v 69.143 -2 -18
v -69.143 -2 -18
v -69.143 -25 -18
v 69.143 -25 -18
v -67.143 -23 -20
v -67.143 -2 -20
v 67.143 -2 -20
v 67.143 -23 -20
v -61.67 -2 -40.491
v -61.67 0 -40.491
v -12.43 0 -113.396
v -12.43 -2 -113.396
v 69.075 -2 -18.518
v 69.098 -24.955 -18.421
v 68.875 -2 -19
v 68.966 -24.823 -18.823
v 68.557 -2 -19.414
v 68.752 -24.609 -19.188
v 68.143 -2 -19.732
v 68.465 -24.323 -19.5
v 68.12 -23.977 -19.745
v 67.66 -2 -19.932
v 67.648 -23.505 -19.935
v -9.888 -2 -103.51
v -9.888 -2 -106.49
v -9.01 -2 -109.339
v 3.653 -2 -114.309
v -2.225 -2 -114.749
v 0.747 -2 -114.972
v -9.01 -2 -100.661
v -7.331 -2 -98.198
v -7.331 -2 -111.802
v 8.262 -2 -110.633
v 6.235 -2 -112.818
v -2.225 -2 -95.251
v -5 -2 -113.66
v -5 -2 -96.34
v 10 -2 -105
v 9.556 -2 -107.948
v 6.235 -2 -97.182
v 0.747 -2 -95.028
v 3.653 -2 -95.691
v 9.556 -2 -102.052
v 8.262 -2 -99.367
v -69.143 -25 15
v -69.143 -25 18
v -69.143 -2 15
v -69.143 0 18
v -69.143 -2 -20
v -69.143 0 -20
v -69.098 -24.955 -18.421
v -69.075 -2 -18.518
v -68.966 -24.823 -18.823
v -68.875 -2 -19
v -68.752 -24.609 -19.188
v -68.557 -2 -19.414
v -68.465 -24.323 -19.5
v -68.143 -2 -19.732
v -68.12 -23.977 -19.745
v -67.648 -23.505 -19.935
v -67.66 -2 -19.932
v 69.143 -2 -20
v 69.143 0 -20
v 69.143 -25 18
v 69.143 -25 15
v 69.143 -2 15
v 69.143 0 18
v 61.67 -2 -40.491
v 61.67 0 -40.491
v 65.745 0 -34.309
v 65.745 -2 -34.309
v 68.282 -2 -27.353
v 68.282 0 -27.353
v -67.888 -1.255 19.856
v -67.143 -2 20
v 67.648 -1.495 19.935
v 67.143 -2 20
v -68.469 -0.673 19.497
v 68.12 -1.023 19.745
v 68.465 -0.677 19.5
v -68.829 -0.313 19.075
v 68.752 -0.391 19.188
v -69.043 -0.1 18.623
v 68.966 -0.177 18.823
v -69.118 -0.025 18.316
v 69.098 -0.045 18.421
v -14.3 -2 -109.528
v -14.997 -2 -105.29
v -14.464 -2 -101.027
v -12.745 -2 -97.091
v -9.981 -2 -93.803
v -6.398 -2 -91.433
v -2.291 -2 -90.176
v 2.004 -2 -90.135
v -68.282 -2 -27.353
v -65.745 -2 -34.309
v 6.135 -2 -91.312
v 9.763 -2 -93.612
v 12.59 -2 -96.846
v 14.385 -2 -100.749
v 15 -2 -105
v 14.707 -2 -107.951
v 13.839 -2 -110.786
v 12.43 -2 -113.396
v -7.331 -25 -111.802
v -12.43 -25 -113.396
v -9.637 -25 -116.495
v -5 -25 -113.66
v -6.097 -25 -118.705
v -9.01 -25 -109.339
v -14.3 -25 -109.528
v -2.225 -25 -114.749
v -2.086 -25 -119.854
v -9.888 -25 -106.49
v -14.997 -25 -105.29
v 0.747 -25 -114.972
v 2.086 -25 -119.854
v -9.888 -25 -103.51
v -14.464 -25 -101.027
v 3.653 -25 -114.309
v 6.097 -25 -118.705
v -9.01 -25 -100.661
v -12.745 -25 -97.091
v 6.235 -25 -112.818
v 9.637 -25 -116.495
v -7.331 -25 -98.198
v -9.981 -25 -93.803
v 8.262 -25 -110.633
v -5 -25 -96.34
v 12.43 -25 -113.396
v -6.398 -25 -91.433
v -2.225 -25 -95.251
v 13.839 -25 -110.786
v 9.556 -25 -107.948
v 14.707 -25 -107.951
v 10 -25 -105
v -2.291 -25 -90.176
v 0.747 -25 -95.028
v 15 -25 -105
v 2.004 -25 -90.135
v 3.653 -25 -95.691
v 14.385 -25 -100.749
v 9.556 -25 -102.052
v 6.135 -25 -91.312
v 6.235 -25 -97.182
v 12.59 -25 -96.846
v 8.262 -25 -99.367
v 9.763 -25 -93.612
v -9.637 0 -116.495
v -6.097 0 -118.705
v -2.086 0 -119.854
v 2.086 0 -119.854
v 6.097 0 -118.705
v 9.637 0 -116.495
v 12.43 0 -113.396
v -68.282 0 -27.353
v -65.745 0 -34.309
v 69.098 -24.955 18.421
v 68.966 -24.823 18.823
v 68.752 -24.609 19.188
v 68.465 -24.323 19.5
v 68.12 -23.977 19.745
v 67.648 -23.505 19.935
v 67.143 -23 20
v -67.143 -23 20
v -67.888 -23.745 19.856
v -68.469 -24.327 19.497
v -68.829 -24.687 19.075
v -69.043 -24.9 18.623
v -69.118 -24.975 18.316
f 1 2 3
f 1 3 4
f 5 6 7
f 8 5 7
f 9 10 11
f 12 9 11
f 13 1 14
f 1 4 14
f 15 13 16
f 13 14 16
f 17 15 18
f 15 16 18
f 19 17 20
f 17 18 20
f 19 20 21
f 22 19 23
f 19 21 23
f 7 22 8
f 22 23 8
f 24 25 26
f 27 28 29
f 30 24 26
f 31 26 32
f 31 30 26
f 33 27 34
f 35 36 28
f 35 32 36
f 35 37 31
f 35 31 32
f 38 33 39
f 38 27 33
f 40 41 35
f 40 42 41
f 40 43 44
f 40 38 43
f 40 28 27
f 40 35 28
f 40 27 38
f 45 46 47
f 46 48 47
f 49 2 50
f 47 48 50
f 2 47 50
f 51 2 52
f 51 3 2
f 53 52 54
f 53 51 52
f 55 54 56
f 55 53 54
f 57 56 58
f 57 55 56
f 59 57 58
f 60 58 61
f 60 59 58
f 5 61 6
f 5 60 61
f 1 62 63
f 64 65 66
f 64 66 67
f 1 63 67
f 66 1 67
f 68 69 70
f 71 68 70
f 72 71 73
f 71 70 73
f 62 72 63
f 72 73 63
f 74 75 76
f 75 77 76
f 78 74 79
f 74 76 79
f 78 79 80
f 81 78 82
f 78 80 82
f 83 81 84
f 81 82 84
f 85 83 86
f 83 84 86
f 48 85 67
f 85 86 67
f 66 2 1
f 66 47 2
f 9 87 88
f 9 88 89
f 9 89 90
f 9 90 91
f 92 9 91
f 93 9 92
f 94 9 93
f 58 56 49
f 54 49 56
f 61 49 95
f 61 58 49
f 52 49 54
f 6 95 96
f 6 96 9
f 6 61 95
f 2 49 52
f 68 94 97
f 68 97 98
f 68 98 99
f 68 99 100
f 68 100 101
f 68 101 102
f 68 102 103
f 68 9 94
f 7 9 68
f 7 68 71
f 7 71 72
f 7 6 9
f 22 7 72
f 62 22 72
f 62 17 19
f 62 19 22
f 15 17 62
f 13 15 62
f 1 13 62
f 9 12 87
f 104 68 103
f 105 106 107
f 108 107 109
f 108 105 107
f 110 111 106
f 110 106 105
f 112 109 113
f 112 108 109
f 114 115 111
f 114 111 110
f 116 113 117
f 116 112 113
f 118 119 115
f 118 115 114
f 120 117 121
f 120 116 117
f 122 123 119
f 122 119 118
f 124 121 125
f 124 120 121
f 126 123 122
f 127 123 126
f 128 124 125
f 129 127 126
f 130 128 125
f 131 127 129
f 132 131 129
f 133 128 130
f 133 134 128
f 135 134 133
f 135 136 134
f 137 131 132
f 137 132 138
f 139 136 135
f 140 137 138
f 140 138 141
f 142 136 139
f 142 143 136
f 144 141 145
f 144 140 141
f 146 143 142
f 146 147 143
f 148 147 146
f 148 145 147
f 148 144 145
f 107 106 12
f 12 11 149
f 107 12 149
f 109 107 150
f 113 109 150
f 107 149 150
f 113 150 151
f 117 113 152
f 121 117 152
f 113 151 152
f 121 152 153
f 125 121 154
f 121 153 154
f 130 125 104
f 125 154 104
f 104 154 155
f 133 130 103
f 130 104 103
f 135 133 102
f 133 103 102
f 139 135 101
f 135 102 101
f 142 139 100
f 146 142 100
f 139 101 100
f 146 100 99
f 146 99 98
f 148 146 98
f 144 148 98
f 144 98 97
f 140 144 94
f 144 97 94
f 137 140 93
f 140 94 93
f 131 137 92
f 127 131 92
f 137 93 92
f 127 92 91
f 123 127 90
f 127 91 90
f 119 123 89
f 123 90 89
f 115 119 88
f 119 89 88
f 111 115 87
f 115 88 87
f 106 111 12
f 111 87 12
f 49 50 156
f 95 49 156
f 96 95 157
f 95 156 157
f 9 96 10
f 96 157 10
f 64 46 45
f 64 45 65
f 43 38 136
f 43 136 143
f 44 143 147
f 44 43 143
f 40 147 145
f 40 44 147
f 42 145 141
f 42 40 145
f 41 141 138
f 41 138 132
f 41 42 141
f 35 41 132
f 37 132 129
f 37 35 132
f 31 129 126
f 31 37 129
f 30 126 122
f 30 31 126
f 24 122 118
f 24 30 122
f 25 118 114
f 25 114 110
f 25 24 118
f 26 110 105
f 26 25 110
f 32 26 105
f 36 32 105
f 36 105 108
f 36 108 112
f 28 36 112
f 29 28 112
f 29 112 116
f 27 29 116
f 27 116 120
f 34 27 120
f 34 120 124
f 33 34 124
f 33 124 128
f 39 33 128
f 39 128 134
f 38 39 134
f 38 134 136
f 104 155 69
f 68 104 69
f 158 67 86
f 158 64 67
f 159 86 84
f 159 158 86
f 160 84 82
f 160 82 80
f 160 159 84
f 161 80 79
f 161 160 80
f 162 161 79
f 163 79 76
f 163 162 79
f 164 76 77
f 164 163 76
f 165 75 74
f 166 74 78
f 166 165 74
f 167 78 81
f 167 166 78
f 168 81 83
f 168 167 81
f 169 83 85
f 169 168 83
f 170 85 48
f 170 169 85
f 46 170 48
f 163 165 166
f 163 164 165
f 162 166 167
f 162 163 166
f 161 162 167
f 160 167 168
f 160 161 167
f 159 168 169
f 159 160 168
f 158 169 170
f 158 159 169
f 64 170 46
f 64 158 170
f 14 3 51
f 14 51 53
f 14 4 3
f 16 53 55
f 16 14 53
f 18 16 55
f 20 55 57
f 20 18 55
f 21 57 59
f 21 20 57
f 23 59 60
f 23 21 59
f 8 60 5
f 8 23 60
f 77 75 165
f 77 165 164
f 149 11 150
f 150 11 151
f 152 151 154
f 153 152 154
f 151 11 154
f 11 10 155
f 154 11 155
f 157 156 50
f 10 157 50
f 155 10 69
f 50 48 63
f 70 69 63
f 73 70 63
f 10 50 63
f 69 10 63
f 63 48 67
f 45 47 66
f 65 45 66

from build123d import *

# Parameters (mm, degrees)
F0_W     = 138.2855419193
F0_H     = 33
F0_R     = 10
F0_H_2   = 5
F0_H_3   = 2
F1_DEPTH = 2
F2_DEPTH = 25
F3_R     = 1.99999


# Not quite as in the source:
# - a fillet or chamfer is up to 0.001 mm smaller than in the source, because OpenCascade refuses the exact size


with BuildPart() as f1:
    # F0 (on Front) → F1 (new body)
    with BuildSketch(Plane.XZ):
        with BuildLine():
            ThreePointArc((61.670333147, -40.4906272888), (67.2163679442, -30.9053098713), (69.1427709597, -20))
            Line((69.1427709597, -20), (-69.1427709597, -20))
            ThreePointArc((-69.1427709597, -20), (-67.2163679442, -30.9053098713), (-61.670333147, -40.4906272888))
            Line((-61.670333147, -40.4906272888), (-12.4304277098, -113.3955027814))
            ThreePointArc((-12.4304277098, -113.3955027814), (-4.3899649403, -90.6567713599), (15, -105))
            ThreePointArc((15, -105), (14.3432286401, -109.3899649403), (12.4304277098, -113.3955027814))
            Line((12.4304277098, -113.3955027814), (61.670333147, -40.4906272888))
        make_face()
        with Locations((0, -1.5)):
            Rectangle(F0_W, F0_H)
        with BuildLine():
            ThreePointArc((-12.4304277098, -113.3955027814), (0, -120), (12.4304277098, -113.3955027814))
            ThreePointArc((12.4304277098, -113.3955027814), (14.3432286401, -109.3899649403), (15, -105))
            ThreePointArc((15, -105), (-4.3899649403, -90.6567713599), (-12.4304277098, -113.3955027814))
        make_face()
        with Locations((0, -105)):
            Circle(F0_R, mode=Mode.SUBTRACT)
        with Locations((0, 17.5)):
            Rectangle(F0_W, F0_H_2)
        with Locations((0, -105)):
            Circle(F0_R)
        with Locations((0, -19)):
            Rectangle(F0_W, F0_H_3)
    extrude(amount=F1_DEPTH)

    # F0 (on Front) → F2 (join)
    with BuildSketch(Plane.XZ):
        with Locations((0, 17.5)):
            Rectangle(F0_W, F0_H_2)
        with Locations((0, -19)):
            Rectangle(F0_W, F0_H_3)
        with BuildLine():
            ThreePointArc((-12.4304277098, -113.3955027814), (0, -120), (12.4304277098, -113.3955027814))
            ThreePointArc((12.4304277098, -113.3955027814), (14.3432286401, -109.3899649403), (15, -105))
            ThreePointArc((15, -105), (-4.3899649403, -90.6567713599), (-12.4304277098, -113.3955027814))
        make_face()
        with Locations((0, -105)):
            Circle(F0_R, mode=Mode.SUBTRACT)
    extrude(amount=F2_DEPTH)

    # F3 (radius 2 in the source; OpenCascade refuses exactly that, so slightly less here)
    f3_edges = [f1.edges().sort_by_distance(p)[0] for p in [
        (69.142771, -12.5, 20),
        (0, -25, 20),
        (-69.142771, -12.5, 20),
        (0, 0, 20),
        (0, -25, -20),
        (69.142771, -13.5, -20),
        (-69.142771, -13.5, -20),
    ]]
    fillet(f3_edges, radius=F3_R)


solid = f1.part
